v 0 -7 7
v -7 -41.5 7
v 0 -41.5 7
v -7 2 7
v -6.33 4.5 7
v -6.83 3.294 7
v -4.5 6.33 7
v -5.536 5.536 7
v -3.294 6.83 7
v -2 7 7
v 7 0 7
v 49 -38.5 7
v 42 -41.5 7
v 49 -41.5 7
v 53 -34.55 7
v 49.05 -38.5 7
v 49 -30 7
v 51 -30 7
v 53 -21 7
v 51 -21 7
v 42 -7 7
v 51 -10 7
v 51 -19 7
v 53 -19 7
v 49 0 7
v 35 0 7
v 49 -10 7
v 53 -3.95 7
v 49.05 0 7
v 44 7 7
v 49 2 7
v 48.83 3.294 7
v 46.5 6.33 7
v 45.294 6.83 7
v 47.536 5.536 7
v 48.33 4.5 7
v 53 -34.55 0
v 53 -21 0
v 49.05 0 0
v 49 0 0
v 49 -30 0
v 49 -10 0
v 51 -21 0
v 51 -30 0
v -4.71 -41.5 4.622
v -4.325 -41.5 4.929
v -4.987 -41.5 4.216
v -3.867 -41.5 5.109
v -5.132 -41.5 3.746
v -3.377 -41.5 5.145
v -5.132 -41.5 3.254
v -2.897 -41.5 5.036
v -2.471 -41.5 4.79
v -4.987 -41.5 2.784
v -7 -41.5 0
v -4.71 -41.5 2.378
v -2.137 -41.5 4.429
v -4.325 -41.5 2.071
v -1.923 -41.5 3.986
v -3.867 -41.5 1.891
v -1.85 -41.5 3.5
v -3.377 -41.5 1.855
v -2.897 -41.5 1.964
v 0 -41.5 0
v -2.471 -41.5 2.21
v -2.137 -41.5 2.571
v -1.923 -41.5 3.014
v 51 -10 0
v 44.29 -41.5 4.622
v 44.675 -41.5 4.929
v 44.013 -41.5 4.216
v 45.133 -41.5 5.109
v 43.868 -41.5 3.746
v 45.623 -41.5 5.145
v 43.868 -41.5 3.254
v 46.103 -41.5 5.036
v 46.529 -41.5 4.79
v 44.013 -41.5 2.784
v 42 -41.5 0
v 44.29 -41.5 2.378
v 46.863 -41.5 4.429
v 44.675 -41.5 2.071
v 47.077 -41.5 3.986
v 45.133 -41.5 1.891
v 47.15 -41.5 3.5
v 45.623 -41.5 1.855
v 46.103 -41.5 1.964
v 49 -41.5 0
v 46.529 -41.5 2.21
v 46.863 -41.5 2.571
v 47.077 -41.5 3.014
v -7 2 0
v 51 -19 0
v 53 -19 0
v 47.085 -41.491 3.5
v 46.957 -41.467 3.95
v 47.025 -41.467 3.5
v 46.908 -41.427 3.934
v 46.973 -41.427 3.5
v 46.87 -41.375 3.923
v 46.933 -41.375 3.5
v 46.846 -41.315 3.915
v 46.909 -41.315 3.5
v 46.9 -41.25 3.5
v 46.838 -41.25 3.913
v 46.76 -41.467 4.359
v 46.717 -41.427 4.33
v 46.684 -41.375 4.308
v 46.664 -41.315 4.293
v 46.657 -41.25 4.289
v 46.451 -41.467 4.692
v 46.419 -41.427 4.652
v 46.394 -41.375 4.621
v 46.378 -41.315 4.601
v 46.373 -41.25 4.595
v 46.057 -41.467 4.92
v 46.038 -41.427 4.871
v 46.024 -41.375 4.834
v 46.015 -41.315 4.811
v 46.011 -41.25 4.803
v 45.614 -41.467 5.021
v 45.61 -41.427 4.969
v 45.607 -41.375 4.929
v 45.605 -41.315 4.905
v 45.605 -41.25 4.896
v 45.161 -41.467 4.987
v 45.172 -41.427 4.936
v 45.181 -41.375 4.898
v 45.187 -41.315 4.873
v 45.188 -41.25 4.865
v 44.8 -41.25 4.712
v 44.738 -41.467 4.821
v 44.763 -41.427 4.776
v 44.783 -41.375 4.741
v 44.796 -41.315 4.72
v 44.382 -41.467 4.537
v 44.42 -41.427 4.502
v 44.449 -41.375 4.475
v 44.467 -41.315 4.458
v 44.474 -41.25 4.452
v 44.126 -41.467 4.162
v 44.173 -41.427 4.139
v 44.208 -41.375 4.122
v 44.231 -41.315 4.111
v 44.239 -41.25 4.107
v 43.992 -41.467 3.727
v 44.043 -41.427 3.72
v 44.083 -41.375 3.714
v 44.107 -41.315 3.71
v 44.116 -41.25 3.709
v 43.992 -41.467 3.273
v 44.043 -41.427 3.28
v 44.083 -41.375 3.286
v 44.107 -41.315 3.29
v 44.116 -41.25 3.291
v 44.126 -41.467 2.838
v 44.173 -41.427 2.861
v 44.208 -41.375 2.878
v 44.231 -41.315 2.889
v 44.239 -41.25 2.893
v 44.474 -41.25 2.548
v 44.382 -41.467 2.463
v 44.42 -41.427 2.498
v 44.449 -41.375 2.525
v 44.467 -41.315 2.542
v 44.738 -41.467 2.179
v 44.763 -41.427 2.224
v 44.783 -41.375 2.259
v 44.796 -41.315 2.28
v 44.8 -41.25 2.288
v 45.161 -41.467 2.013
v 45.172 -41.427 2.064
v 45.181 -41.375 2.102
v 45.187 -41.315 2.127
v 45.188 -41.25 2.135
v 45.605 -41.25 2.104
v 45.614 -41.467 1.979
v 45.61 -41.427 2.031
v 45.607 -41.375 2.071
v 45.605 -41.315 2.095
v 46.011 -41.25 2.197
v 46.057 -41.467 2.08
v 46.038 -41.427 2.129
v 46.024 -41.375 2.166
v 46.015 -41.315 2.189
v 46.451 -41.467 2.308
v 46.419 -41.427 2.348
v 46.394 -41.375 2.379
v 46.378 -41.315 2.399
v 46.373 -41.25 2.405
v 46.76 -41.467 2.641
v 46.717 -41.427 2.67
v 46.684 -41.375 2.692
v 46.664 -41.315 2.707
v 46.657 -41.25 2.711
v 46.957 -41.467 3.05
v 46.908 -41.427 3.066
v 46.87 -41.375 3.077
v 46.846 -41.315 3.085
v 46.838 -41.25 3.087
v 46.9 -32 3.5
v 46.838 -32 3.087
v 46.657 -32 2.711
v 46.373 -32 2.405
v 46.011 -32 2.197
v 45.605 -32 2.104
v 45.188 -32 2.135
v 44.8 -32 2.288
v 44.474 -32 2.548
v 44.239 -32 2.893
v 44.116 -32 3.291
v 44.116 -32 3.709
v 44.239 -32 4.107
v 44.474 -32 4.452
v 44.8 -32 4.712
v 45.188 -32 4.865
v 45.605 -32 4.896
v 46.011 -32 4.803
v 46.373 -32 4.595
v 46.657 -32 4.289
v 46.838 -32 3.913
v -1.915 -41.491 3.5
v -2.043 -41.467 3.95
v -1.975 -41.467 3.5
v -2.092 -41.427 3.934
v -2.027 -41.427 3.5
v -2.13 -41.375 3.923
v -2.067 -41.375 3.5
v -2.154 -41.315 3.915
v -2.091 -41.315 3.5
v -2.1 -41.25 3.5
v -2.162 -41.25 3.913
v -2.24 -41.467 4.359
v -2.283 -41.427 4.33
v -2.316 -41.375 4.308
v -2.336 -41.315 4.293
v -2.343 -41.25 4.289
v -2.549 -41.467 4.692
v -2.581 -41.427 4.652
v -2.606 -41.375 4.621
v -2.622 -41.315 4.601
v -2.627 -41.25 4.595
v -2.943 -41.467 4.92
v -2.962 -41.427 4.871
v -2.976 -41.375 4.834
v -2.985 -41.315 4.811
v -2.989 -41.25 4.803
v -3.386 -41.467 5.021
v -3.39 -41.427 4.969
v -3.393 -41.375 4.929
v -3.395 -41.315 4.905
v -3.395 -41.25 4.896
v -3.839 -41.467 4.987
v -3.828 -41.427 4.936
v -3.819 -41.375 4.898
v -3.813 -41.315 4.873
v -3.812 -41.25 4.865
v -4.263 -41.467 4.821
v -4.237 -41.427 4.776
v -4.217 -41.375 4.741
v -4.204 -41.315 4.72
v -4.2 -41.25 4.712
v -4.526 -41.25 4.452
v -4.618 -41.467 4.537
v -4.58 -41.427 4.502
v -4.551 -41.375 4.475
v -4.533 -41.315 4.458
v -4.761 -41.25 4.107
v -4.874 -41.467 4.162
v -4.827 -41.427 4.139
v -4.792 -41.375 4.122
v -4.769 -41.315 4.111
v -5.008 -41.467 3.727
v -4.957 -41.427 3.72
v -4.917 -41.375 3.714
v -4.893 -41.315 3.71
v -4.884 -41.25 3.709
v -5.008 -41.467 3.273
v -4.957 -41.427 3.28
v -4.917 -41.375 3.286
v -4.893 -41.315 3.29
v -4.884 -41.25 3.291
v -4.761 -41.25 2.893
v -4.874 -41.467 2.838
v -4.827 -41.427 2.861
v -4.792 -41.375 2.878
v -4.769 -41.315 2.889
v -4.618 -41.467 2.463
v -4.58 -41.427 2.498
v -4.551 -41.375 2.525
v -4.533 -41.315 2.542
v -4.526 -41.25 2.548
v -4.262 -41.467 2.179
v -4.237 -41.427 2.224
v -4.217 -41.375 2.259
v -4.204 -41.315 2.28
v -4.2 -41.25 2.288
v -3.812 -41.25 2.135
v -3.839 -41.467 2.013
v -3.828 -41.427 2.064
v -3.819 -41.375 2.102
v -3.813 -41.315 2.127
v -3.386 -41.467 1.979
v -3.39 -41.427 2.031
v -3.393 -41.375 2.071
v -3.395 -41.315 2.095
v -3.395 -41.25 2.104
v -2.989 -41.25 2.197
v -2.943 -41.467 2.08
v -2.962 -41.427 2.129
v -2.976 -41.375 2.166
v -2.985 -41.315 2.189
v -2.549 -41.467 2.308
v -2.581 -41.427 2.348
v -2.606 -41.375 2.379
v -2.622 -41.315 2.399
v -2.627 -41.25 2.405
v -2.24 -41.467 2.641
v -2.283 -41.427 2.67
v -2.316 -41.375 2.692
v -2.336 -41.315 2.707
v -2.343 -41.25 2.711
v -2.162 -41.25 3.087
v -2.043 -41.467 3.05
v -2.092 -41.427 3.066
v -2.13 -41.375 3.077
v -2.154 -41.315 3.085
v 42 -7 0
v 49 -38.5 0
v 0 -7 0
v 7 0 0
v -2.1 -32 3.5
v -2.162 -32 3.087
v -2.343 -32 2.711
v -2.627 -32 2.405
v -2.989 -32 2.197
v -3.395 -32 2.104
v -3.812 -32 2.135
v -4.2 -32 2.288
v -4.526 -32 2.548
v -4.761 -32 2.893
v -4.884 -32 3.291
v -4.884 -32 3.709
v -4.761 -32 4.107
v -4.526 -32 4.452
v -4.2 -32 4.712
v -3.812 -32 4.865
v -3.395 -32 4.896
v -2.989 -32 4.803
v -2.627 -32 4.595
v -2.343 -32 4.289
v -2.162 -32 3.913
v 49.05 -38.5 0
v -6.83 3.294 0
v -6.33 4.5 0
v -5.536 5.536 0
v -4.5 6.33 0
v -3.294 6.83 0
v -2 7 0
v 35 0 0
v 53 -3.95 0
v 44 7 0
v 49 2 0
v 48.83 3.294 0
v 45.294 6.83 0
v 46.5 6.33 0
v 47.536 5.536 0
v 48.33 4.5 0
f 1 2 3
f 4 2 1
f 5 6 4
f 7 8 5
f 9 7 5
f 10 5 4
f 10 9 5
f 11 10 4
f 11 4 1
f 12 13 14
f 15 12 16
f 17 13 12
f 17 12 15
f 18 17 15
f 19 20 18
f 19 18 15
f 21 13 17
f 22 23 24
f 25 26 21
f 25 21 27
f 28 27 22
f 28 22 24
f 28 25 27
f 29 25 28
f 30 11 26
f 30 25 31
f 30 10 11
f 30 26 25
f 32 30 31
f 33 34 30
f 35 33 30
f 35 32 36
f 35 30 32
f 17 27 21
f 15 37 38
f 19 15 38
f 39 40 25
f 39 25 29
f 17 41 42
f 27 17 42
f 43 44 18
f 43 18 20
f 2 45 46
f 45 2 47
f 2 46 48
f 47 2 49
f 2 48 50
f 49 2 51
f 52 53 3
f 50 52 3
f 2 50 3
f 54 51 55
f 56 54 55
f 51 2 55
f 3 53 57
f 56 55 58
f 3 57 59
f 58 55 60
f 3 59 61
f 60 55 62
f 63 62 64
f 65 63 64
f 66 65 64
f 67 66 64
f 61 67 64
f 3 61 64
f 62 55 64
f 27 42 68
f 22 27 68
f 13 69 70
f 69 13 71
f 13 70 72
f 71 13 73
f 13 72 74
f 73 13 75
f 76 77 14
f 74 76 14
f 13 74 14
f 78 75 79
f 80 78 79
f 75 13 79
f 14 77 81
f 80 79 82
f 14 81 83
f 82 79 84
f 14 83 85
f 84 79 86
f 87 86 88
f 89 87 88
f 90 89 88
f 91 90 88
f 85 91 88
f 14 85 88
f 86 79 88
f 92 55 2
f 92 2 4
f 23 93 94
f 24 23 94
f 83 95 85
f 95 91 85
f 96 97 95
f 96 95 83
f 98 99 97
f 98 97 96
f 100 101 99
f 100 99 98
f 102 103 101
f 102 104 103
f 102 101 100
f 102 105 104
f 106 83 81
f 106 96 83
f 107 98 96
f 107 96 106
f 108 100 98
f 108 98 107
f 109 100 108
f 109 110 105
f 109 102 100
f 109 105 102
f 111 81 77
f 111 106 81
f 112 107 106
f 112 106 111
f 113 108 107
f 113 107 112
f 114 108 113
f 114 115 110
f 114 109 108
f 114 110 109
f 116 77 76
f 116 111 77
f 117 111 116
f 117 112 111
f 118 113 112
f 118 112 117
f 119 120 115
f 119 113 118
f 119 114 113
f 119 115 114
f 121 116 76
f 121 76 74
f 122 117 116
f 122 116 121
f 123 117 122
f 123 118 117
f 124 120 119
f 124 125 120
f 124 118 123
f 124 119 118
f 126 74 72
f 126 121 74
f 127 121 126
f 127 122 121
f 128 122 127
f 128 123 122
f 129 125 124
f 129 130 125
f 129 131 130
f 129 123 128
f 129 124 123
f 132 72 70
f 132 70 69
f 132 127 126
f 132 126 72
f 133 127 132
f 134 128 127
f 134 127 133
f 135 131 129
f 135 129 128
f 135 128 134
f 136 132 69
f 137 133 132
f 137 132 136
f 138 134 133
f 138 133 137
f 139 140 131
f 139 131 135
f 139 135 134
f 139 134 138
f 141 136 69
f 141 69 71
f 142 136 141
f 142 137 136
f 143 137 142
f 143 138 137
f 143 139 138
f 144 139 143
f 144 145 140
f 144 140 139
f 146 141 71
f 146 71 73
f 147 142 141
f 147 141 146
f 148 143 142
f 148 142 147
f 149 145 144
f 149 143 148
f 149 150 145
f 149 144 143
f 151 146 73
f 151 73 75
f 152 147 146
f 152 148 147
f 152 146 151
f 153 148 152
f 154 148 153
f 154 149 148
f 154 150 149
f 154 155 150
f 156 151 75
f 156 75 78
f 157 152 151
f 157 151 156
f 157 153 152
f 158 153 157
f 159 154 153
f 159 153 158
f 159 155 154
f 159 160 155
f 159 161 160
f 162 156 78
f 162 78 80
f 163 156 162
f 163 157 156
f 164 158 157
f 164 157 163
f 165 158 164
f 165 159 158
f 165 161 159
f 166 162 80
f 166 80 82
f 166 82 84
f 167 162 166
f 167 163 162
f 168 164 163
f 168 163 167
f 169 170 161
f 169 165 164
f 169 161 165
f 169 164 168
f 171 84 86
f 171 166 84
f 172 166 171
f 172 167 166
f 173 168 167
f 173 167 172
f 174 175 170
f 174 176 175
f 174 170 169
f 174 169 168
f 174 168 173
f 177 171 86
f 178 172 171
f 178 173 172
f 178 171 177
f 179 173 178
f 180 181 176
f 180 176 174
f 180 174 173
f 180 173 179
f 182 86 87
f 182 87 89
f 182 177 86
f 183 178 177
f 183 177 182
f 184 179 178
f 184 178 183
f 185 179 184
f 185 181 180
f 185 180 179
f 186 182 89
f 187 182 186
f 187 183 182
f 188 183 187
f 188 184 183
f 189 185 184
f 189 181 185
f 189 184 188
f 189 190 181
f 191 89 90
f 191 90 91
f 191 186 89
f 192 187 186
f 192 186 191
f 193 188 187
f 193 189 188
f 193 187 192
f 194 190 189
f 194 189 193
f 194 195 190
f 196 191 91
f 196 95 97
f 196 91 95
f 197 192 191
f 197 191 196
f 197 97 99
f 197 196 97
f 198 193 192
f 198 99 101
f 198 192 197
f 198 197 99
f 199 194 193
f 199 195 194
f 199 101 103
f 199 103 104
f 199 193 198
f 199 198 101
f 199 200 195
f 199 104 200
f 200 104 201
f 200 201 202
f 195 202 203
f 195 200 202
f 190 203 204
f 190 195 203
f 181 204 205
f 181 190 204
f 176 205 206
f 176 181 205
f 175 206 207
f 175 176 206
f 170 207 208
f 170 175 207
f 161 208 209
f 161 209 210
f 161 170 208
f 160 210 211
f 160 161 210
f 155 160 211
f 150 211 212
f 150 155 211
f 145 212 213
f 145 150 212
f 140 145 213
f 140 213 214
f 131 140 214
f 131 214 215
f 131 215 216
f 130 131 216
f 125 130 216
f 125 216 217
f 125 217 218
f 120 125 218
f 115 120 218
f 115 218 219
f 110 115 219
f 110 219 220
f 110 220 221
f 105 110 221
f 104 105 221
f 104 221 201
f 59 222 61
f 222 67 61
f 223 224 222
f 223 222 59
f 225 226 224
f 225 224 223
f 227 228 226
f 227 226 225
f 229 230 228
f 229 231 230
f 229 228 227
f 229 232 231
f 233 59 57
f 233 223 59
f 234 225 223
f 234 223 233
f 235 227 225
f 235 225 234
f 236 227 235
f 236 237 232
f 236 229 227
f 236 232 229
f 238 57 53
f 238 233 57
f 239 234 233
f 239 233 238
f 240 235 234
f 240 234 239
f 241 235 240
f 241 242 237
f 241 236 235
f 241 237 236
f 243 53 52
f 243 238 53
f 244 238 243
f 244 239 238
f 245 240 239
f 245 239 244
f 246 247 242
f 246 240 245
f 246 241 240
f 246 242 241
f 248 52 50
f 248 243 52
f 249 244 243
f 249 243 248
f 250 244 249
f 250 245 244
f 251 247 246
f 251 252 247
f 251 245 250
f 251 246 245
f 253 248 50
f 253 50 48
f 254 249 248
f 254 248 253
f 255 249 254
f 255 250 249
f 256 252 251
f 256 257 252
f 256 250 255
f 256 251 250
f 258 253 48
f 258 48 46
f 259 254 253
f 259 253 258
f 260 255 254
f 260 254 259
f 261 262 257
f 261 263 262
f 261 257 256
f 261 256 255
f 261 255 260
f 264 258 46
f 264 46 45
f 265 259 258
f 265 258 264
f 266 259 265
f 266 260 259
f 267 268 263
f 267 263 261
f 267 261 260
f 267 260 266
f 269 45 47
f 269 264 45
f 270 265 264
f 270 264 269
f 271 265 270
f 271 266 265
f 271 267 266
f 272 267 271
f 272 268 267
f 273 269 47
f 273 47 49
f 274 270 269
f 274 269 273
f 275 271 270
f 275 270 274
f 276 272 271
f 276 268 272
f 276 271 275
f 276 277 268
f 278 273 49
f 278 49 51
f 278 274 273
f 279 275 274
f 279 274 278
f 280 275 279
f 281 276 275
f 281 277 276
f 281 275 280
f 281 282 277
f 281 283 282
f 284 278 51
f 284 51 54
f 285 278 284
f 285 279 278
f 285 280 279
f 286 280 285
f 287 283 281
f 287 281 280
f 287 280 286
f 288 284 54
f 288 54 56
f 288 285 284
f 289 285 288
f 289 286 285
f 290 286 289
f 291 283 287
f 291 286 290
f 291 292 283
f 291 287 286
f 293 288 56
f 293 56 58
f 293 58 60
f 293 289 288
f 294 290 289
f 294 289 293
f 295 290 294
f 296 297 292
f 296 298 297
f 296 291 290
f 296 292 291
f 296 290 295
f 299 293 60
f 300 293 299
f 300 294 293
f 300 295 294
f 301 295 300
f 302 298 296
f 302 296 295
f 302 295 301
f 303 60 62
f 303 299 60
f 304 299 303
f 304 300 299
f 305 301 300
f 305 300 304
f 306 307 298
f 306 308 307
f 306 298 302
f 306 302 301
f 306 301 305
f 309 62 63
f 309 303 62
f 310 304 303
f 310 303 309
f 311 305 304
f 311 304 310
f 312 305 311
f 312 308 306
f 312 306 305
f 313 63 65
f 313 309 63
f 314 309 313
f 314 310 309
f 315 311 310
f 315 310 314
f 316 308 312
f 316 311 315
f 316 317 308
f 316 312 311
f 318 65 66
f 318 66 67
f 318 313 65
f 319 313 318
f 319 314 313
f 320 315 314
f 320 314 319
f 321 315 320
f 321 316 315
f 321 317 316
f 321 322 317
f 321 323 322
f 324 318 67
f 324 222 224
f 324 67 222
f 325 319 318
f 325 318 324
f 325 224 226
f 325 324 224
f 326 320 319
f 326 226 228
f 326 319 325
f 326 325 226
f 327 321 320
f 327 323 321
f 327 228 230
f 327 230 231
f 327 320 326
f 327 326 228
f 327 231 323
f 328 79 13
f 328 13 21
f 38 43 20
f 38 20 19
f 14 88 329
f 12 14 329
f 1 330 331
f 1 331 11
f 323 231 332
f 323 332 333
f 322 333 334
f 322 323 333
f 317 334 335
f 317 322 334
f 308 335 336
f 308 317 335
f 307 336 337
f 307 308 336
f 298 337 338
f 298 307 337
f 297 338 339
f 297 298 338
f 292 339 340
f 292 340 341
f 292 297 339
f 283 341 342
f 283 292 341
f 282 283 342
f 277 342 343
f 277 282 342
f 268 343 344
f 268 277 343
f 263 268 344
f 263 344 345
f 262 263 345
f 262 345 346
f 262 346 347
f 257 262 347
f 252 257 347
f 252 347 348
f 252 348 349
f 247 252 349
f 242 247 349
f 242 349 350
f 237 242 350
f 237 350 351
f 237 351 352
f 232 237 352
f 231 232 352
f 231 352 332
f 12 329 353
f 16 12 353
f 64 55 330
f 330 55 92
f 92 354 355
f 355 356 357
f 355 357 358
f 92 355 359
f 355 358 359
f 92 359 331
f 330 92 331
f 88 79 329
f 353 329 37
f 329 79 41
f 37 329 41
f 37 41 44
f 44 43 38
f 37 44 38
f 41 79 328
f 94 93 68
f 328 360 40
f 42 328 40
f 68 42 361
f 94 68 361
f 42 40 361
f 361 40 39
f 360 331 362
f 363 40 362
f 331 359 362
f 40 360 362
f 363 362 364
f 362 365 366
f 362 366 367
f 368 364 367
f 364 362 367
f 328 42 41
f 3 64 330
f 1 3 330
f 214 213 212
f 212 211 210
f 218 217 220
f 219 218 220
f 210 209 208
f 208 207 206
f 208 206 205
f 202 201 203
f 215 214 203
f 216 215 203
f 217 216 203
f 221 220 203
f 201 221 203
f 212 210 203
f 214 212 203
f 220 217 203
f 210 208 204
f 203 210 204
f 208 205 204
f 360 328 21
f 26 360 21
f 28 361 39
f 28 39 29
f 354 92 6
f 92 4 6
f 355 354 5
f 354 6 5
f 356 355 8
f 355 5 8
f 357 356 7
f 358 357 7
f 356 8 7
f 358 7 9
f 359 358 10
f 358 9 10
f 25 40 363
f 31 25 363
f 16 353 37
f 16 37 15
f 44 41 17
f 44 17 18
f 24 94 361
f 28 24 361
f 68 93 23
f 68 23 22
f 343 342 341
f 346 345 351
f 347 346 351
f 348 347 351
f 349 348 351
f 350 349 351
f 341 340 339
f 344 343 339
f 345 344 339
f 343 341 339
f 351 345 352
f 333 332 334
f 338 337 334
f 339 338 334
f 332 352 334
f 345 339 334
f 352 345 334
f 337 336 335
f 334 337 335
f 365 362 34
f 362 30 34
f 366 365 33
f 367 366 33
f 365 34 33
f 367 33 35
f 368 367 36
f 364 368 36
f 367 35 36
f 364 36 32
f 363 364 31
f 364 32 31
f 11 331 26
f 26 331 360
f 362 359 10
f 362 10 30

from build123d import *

# Parameters (mm, degrees)
CYLINDER001_R          = 1.4
CYLINDER001_DEPTH      = 10
CYLINDER001_ROLL_ANGLE = -90
CYLINDER_R             = 1.4
CYLINDER_DEPTH         = 10
CYLINDER_ROLL_ANGLE    = -90
BOX005_W               = 2
BOX005_H               = 2
BOX005_DEPTH           = 7
BOX003_W               = 2
BOX003_H               = 20
BOX003_DEPTH           = 7
BOX001_W               = 7
BOX001_H               = 48.5
BOX001_DEPTH           = 7
BOX002_W               = 7
BOX002_H               = 48.5
BOX002_DEPTH           = 7
BOX004_W               = 4
BOX004_H               = 38.5
BOX004_DEPTH           = 7
BOX_W                  = 42
BOX_H                  = 7
BOX_DEPTH              = 7
CHAMFER_SIZE           = 3.95
CHAMFER001_SIZE        = 7
FILLET_R               = 5
FILLET001_R            = 0.25


with BuildPart() as bolt2:
    # Cylinder001 → Cylinder001 (new body)
    with BuildSketch(Plane.XY):
        Circle(CYLINDER001_R)
    extrude(amount=CYLINDER001_DEPTH)


with BuildPart() as bolt2_1:
    # Cylinder001 roll: moved
    add(bolt2.part.rotate(Axis((0, 0, 0), (1, 0, 0)), CYLINDER001_ROLL_ANGLE))


with BuildPart() as bolt2_2:
    # Cylinder001 placement: moved
    add(bolt2_1.part.moved(Location((45.5, -42, 3.5))))


with BuildPart() as bolt1:
    # Cylinder → Cylinder (new body)
    with BuildSketch(Plane.XY):
        Circle(CYLINDER_R)
    extrude(amount=CYLINDER_DEPTH)


with BuildPart() as bolt1_1:
    # Cylinder roll: moved
    add(bolt1.part.rotate(Axis((0, 0, 0), (1, 0, 0)), CYLINDER_ROLL_ANGLE))


with BuildPart() as bolt1_2:
    # Cylinder placement: moved
    add(bolt1_1.part.moved(Location((-3.5, -42, 3.5))))


with BuildPart() as cable_slot2:
    # Box005 → Box005 (new body)
    with BuildSketch(Plane(origin=(51, -21, 0), x_dir=(1, 0, 0), z_dir=(0, 0, 1))):
        with Locations((1, 1)):
            Rectangle(BOX005_W, BOX005_H)
    extrude(amount=BOX005_DEPTH)


with BuildPart() as cable_slot:
    # Box003 → Box003 (new body)
    with BuildSketch(Plane(origin=(49, -30, 0), x_dir=(1, 0, 0), z_dir=(0, 0, 1))):
        with Locations((1, 10)):
            Rectangle(BOX003_W, BOX003_H)
    extrude(amount=BOX003_DEPTH)


with BuildPart() as side1:
    # Box001 → Box001 (new body)
    with BuildSketch(Plane(origin=(-7, -41.5, 0), x_dir=(1, 0, 0), z_dir=(0, 0, 1))):
        with Locations((3.5, 24.25)):
            Rectangle(BOX001_W, BOX001_H)
    extrude(amount=BOX001_DEPTH)


with BuildPart() as side2:
    # Box002 → Box002 (new body)
    with BuildSketch(Plane(origin=(42, -41.5, 0), x_dir=(1, 0, 0), z_dir=(0, 0, 1))):
        with Locations((3.5, 24.25)):
            Rectangle(BOX002_W, BOX002_H)
    extrude(amount=BOX002_DEPTH)


with BuildPart() as cable_support:
    # Box004 → Box004 (new body)
    with BuildSketch(Plane(origin=(49, -38.5, 0), x_dir=(1, 0, 0), z_dir=(0, 0, 1))):
        with Locations((2, 19.25)):
            Rectangle(BOX004_W, BOX004_H)
    extrude(amount=BOX004_DEPTH)


with BuildPart() as holder_clamp:
    # Box → Box (new body)
    with BuildSketch(Plane.XY):
        with Locations((21, 3.5)):
            Rectangle(BOX_W, BOX_H)
    extrude(amount=BOX_DEPTH)

    # Fusion: union Side1, Side2, cable-support
    add(side1.part)
    add(side2.part)
    add(cable_support.part)

    # Cut: cut cable-slot
    add(cable_slot.part, mode=Mode.SUBTRACT)

    # Cut001: cut cable-slot2
    add(cable_slot2.part, mode=Mode.SUBTRACT)

    # Cut002: cut Bolt1
    add(bolt1_2.part, mode=Mode.SUBTRACT)

    # Cut003: cut Bolt2
    add(bolt2_2.part, mode=Mode.SUBTRACT)

    # Chamfer
    chamfer_edges = [holder_clamp.edges().sort_by_distance(p)[0] for p in [
        (53, -38.5, 3.5),
        (53, 0, 3.5),
    ]]
    chamfer(chamfer_edges, length=CHAMFER_SIZE)

    # Chamfer001
    chamfer001_edges = [holder_clamp.edges().sort_by_distance(p)[0] for p in [
        (42, 0, 3.5),
        (0, 0, 3.5),
    ]]
    chamfer(chamfer001_edges, length=CHAMFER001_SIZE)

    # Fillet
    fillet_edges = [holder_clamp.edges().sort_by_distance(p)[0] for p in [
        (49, 7, 3.5),
        (-7, 7, 3.5),
    ]]
    fillet(fillet_edges, radius=FILLET_R)

    # Fillet001
    fillet001_edges = [holder_clamp.edges().sort_by_distance(p)[0] for p in [
        (44.1, -41.5, 3.5),
        (-4.9, -41.5, 3.5),
    ]]
    fillet(fillet001_edges, radius=FILLET001_R)


solid = holder_clamp.part
